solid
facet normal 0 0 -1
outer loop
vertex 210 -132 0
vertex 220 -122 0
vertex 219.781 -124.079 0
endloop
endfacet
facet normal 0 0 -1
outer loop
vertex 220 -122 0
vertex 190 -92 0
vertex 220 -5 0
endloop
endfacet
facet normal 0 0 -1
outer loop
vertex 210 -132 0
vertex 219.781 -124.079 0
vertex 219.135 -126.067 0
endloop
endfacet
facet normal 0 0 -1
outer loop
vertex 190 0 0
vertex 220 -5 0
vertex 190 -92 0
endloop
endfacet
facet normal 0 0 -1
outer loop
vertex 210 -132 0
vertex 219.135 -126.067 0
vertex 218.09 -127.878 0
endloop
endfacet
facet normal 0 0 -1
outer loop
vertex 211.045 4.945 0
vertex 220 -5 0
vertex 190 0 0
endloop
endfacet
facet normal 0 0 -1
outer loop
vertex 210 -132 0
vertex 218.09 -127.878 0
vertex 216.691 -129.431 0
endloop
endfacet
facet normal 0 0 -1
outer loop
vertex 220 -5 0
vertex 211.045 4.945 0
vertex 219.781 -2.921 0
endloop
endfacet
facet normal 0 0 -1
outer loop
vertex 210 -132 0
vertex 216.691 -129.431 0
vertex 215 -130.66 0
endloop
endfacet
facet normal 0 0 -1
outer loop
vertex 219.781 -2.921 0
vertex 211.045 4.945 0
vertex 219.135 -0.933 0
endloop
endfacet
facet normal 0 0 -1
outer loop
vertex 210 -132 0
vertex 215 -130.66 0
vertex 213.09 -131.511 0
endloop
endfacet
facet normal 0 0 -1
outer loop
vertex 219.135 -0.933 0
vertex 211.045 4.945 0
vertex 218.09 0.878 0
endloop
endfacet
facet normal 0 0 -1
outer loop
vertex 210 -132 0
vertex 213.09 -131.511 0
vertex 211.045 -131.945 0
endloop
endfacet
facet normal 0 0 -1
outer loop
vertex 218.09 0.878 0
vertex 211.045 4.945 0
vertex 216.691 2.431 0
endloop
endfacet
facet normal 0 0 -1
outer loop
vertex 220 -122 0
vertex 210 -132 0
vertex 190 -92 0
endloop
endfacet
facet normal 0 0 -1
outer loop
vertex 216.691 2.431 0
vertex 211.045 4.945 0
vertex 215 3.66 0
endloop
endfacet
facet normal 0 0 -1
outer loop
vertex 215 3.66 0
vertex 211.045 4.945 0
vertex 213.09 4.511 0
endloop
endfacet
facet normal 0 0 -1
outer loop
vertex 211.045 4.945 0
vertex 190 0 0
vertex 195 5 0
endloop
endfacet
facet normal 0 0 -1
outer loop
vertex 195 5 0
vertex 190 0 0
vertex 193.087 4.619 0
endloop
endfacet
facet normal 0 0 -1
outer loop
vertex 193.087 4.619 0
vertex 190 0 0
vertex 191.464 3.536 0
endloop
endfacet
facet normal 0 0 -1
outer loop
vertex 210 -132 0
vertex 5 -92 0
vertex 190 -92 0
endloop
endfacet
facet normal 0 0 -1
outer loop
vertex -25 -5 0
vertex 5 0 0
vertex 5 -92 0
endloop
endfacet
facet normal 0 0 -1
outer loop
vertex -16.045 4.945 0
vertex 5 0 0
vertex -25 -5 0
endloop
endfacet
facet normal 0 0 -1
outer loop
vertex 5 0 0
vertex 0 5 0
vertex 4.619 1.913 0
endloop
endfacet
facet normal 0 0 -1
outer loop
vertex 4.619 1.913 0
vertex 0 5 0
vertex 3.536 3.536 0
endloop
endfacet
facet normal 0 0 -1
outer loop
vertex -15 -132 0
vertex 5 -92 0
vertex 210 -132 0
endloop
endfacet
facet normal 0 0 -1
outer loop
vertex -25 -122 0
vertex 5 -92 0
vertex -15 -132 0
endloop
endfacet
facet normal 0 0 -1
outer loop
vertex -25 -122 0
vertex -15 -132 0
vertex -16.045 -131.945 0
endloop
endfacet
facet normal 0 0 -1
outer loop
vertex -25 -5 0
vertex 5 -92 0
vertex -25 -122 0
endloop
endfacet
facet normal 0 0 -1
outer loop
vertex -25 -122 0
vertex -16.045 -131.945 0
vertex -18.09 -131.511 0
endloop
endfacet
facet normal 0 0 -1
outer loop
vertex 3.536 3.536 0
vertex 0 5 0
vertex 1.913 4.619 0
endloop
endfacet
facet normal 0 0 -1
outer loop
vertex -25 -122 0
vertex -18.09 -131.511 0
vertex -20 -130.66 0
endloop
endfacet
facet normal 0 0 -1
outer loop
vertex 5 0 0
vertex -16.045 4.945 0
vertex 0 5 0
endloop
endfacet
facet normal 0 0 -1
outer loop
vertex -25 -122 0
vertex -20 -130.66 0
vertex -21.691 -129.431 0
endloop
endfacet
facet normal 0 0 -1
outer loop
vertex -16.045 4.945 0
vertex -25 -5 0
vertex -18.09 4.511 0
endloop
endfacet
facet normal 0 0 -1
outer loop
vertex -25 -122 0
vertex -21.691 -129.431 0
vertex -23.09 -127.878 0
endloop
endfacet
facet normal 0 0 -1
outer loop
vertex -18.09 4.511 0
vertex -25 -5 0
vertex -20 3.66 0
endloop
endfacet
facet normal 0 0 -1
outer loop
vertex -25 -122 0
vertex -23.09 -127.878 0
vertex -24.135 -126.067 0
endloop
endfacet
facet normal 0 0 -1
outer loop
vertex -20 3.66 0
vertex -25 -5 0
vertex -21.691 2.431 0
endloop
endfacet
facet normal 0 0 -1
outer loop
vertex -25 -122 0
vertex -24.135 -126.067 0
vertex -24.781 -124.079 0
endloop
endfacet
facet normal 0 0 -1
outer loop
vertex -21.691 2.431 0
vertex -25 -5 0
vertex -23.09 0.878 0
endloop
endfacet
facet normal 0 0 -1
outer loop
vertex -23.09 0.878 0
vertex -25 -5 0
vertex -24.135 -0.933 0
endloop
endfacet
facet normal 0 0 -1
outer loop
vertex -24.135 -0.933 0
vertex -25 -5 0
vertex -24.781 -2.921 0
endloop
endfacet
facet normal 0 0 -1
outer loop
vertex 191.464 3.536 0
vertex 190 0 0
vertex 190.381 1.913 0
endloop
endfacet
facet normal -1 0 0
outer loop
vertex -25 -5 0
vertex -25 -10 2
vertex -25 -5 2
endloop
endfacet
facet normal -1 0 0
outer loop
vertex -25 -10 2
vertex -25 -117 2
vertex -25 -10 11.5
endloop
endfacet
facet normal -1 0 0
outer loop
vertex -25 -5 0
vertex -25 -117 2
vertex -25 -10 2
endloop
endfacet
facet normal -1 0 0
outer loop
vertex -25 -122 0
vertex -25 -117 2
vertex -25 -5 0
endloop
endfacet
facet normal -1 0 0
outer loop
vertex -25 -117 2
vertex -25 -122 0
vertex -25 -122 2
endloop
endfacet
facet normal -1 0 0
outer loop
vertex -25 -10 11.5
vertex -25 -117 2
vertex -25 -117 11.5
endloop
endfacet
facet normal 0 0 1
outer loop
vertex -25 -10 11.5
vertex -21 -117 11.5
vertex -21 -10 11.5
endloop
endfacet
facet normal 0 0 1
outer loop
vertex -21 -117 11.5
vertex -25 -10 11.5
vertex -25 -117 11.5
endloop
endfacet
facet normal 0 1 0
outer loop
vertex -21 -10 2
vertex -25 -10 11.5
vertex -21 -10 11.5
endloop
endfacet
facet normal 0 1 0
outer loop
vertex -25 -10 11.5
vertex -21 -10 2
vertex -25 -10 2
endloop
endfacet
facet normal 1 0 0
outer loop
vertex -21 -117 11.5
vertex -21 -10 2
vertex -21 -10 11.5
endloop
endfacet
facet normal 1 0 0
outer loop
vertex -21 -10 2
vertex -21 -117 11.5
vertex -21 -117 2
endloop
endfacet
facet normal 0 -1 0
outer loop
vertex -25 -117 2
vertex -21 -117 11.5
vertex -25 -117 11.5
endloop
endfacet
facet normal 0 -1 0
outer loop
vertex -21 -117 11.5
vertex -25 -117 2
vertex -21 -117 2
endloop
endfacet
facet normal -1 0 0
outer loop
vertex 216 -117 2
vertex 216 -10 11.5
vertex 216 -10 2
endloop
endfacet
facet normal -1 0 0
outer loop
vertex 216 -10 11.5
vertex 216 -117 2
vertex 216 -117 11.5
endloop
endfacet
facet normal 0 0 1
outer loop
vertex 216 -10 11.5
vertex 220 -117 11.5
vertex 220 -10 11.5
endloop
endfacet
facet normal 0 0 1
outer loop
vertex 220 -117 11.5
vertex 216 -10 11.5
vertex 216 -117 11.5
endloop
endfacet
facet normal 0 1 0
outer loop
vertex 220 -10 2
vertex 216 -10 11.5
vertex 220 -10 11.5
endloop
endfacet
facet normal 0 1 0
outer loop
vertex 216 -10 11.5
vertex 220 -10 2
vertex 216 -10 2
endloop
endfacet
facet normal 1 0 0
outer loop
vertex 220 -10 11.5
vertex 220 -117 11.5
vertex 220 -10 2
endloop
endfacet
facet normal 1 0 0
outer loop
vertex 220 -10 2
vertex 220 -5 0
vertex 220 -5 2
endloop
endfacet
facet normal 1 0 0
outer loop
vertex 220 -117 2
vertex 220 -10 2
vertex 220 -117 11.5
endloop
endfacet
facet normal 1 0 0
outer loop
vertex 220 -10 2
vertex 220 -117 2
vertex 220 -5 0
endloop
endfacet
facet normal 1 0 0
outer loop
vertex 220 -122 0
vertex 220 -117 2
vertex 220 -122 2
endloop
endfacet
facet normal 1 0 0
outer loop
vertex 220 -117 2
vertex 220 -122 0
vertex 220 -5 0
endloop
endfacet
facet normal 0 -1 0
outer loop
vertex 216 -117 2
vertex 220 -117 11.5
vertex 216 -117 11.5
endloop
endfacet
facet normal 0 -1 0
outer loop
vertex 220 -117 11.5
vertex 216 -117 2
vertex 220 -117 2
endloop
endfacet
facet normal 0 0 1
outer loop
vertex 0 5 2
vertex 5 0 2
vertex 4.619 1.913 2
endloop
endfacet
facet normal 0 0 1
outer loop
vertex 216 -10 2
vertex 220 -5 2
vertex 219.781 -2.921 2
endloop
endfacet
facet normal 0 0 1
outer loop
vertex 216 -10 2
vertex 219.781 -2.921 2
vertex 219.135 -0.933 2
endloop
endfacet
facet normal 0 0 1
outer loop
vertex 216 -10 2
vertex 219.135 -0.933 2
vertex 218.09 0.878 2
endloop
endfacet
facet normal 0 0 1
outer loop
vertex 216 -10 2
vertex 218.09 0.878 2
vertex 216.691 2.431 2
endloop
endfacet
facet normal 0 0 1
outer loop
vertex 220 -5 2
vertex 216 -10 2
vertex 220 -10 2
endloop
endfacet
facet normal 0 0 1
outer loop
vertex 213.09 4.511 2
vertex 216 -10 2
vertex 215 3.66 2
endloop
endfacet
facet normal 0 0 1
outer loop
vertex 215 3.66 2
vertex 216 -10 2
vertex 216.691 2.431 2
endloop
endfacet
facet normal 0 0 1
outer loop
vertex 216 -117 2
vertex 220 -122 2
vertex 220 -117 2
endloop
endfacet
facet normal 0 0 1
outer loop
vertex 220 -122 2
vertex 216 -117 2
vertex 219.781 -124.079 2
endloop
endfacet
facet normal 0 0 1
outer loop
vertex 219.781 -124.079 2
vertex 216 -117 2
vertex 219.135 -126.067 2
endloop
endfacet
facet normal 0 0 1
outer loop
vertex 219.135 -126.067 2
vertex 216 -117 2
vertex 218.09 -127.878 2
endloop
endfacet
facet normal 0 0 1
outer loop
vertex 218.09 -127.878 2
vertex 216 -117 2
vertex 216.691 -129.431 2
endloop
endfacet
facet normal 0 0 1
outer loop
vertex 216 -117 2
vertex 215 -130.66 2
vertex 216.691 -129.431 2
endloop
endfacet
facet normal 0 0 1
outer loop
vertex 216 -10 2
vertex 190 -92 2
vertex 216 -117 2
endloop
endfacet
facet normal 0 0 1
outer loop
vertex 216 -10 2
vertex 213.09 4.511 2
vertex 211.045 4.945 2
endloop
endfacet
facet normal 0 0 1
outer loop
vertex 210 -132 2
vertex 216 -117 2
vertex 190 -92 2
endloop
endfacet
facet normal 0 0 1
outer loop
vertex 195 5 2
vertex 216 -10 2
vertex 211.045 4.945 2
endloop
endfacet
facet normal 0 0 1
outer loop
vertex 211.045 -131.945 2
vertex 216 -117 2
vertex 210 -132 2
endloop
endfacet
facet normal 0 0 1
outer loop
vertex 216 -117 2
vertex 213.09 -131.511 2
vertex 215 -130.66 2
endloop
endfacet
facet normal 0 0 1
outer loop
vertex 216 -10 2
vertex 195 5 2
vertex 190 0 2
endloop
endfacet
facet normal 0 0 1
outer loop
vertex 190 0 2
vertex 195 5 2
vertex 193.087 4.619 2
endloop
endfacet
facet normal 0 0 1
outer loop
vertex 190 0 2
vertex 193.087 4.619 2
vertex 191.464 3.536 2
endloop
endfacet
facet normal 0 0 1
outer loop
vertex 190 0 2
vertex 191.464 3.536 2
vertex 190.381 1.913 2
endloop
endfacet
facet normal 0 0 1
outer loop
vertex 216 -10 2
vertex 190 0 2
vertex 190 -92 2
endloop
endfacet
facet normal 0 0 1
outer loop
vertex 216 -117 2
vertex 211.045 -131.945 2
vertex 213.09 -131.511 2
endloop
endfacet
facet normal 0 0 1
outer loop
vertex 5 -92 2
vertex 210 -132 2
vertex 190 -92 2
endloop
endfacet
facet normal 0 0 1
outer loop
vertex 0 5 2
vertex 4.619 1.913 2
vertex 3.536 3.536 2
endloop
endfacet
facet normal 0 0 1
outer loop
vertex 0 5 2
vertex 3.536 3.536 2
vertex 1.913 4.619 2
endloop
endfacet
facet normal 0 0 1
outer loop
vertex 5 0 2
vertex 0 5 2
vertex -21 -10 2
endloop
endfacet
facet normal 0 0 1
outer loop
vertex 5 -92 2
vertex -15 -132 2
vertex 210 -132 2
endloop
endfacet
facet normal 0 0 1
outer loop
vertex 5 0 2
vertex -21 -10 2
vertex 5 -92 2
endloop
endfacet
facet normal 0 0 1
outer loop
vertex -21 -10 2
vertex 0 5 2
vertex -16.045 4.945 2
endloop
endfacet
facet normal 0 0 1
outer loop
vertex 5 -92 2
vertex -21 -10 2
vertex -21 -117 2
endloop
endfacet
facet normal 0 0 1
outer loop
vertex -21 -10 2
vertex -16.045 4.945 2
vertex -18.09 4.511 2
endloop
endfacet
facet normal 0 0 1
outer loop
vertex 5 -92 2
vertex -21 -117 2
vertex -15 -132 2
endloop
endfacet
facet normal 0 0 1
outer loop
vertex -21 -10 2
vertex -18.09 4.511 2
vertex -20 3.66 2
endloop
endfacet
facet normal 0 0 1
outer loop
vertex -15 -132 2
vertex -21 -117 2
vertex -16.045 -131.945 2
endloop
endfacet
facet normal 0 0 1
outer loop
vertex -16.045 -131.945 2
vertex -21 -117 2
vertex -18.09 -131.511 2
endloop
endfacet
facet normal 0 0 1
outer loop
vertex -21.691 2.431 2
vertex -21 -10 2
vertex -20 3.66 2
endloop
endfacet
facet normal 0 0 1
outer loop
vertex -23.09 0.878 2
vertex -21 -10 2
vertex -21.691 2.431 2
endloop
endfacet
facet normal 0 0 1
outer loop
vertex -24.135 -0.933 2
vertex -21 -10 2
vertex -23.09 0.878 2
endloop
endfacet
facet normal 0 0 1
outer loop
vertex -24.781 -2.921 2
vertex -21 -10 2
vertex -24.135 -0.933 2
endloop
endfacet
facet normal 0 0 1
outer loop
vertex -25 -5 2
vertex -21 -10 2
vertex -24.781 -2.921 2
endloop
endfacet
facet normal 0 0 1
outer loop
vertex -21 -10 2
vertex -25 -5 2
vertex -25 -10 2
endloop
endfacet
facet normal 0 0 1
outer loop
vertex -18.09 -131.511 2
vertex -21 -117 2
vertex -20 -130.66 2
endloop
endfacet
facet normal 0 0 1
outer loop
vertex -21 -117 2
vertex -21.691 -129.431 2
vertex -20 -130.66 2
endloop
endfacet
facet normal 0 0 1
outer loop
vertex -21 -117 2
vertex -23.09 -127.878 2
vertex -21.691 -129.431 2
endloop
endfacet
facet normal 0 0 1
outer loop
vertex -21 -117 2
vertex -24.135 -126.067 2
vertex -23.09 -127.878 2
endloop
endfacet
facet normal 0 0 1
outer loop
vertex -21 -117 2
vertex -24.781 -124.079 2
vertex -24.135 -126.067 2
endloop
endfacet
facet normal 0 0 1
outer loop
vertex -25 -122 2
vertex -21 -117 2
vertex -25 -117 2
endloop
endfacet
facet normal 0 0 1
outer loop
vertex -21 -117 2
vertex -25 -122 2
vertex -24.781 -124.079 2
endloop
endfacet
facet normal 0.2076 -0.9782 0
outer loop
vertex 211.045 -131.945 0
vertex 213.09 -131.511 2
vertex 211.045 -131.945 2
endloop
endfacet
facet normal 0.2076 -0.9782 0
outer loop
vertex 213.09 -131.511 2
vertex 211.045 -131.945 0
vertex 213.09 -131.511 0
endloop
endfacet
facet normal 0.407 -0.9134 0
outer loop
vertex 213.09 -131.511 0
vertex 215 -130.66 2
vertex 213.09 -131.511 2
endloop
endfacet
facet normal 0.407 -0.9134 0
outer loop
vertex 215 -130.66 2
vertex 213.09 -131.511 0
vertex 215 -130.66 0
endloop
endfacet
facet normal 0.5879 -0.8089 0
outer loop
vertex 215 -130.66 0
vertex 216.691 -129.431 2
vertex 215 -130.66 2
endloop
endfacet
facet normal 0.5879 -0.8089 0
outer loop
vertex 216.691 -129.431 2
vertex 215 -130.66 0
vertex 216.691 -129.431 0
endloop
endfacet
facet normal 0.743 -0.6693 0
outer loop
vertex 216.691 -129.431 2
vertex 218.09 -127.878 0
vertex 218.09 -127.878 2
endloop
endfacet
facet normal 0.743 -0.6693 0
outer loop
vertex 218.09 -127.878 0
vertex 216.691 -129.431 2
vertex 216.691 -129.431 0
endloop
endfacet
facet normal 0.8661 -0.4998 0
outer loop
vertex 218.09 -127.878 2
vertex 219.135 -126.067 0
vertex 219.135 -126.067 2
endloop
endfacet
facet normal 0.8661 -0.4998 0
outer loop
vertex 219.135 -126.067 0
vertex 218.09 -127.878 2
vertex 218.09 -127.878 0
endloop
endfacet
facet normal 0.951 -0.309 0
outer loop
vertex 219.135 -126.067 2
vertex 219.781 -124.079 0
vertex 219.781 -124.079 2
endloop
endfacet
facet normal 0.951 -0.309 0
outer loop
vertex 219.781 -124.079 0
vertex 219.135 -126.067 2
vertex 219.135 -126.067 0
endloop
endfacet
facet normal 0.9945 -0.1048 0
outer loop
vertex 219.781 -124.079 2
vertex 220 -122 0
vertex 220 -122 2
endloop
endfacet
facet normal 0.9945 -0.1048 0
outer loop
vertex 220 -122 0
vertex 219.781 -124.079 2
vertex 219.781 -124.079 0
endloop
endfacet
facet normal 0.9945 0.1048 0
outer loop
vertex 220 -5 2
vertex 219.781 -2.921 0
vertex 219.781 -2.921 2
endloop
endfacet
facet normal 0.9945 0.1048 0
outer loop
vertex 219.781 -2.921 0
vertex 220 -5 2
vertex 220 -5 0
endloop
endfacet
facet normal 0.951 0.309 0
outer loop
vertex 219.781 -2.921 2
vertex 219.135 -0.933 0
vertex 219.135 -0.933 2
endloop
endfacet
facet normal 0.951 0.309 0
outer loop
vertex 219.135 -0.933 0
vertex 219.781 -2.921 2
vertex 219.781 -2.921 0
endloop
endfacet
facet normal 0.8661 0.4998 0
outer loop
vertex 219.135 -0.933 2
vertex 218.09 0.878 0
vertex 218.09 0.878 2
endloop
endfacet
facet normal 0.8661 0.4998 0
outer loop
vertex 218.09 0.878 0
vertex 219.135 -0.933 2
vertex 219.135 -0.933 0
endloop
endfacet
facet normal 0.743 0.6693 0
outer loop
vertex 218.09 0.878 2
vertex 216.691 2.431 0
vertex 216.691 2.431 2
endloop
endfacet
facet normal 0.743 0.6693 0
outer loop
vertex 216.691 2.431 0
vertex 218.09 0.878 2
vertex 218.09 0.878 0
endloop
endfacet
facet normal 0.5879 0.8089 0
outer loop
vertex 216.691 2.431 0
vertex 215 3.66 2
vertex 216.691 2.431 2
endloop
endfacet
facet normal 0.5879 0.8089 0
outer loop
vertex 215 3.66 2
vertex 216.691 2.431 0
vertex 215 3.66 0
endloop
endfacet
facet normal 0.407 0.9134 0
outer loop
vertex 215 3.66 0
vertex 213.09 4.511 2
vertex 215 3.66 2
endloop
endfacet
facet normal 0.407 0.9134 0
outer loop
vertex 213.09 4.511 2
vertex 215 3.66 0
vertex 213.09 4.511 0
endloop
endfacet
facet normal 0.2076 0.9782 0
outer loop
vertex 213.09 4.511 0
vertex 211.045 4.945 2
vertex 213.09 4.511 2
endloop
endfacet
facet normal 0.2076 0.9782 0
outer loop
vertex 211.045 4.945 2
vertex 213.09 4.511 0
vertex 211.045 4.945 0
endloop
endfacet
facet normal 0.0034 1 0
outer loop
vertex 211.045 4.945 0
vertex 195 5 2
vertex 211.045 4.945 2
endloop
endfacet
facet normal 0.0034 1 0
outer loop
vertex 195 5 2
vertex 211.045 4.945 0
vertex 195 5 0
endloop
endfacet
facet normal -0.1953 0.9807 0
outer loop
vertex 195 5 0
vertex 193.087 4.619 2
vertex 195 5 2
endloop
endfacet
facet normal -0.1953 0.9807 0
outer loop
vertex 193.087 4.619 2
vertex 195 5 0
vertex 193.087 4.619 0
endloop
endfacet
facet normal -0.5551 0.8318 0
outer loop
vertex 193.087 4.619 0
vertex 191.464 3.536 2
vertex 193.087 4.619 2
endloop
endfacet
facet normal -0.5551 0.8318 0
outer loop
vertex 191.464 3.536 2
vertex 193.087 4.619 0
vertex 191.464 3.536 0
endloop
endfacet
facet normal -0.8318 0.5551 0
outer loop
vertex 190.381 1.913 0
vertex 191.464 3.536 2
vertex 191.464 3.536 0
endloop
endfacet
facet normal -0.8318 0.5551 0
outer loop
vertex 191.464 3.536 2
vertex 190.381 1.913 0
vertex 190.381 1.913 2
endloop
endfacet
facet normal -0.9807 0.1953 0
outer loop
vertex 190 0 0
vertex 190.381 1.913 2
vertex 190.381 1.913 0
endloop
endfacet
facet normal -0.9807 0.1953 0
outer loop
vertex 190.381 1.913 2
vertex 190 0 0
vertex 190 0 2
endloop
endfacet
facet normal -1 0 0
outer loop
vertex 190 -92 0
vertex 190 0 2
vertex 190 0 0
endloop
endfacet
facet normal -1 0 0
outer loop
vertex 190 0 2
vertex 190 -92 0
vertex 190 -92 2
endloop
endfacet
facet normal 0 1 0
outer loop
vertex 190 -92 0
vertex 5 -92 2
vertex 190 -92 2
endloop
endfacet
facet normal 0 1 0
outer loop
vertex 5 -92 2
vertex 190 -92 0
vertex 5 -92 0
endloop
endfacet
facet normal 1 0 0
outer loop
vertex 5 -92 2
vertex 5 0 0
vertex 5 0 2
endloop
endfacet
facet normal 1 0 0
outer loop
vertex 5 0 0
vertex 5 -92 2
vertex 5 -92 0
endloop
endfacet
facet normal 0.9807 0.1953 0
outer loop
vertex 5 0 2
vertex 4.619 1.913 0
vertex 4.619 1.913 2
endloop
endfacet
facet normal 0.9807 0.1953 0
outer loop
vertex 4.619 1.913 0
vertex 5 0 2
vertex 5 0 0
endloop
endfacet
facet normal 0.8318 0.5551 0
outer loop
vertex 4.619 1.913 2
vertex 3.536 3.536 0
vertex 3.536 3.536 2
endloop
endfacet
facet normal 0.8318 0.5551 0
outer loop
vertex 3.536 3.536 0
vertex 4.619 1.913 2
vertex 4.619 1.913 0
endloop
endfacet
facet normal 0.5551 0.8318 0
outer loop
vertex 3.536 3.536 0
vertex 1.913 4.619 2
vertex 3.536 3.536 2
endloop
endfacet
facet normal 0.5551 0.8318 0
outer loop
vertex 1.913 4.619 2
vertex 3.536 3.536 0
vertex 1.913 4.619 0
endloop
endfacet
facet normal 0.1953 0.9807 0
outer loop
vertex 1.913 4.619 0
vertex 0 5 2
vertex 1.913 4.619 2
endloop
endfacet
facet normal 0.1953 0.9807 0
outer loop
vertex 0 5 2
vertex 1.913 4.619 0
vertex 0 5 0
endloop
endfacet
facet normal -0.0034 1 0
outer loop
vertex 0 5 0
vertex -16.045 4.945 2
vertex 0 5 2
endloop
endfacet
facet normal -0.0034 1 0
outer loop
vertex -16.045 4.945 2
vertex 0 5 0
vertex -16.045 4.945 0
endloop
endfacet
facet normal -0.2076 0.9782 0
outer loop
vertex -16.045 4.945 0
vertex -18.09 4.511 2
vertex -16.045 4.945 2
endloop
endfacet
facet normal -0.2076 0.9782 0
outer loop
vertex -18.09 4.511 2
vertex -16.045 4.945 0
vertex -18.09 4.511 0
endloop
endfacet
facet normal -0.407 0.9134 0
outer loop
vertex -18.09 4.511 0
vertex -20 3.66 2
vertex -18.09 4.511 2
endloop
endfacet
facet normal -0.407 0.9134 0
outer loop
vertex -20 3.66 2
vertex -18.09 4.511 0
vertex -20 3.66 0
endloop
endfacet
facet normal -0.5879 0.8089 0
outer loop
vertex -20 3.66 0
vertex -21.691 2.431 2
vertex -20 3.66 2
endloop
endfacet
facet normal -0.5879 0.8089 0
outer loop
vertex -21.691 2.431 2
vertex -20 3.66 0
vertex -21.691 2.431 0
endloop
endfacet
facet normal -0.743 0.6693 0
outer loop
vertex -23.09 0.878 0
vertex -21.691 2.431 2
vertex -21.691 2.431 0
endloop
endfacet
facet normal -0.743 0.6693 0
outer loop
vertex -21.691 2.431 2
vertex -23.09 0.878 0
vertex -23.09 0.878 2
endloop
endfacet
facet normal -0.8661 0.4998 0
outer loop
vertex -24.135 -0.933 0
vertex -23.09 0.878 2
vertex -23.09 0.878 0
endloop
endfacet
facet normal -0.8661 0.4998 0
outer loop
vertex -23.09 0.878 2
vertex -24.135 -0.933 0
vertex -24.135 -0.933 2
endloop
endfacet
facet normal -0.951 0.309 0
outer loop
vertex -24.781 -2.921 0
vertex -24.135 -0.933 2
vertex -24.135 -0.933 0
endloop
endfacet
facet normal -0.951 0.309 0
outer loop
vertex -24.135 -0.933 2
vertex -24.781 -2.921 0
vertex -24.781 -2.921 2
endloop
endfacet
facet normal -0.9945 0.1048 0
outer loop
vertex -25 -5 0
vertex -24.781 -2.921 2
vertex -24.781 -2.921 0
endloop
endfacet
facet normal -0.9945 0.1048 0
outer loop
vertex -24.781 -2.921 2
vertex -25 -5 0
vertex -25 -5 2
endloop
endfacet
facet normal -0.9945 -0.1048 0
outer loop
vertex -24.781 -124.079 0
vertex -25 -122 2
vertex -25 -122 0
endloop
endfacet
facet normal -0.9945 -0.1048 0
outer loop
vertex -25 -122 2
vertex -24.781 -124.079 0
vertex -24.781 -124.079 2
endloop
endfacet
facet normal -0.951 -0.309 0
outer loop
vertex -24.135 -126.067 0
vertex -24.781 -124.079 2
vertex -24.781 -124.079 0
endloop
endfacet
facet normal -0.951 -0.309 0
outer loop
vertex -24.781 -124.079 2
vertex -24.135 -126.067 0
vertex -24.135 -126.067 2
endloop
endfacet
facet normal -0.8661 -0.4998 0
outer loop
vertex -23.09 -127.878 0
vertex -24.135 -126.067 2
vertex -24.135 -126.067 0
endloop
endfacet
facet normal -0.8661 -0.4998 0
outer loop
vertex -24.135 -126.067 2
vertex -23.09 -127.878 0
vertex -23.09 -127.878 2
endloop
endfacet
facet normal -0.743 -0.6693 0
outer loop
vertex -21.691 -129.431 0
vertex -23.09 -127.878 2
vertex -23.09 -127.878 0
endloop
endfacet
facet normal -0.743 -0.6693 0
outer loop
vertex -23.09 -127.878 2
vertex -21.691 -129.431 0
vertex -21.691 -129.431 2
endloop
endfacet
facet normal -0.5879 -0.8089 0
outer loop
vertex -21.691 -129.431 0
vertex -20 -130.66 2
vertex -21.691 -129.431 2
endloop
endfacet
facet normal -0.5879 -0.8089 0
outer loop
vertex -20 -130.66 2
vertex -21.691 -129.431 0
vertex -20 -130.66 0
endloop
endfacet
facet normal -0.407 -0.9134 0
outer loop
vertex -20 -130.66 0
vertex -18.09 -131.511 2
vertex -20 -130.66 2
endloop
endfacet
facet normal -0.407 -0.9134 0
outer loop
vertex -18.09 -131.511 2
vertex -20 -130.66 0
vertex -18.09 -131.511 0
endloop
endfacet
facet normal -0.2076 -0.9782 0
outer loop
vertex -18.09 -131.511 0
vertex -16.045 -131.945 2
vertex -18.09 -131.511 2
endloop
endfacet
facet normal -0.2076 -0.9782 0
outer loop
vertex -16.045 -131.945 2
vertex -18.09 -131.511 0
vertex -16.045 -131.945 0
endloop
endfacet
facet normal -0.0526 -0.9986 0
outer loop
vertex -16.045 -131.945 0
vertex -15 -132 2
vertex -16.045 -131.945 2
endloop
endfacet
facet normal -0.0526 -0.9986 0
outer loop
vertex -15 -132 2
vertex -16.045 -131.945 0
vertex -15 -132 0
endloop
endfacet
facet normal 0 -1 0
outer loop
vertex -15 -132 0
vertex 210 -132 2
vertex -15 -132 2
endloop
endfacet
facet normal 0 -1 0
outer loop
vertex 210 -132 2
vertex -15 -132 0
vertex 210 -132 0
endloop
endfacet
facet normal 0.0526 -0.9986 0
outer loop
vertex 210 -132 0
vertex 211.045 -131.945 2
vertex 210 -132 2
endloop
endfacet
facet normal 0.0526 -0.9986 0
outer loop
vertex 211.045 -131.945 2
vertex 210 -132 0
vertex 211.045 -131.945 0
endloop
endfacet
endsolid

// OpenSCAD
// Tablet dimensions:
tabletX = 210;
tabletY = 127;
tabletZ = 9.5;

walls = 2;
//	⚠️ This is where the clean code ends. ⚠️
//
//	Explore on your own risk.

module base(){
    linear_extrude(walls){
        hull(){
            circle(5);
            translate([-15, -5, 0]) circle(10);
            translate([-15, -tabletY+5, 0]) circle(10);
            #translate([-15, -tabletY-5, 0]) square(20);
        }

        hull(){
            translate([-12.5, -tabletY-5, 0]) square(40);
            translate([tabletX-60, -tabletY-5, 0]) square(40);
        }

        hull(){
            #translate([tabletX-15, 0, 0]) circle(5);
            translate([tabletX, -5, 0]) circle(10);
            #translate([tabletX, -tabletY+5, 0]) circle(10);
            translate([tabletX-20, -tabletY-5, 0]) square(20);
        }
    }
}

module topper(){
    linear_extrude(tabletZ+2){
        square([walls+2, tabletY-20]);
    }

    linear_extrude(tabletZ+2){
        translate([tabletX+31, 0, 0])square([walls+2, tabletY-20]);
    }
}


base();
#translate([-25, -tabletY+10, 0])topper();
